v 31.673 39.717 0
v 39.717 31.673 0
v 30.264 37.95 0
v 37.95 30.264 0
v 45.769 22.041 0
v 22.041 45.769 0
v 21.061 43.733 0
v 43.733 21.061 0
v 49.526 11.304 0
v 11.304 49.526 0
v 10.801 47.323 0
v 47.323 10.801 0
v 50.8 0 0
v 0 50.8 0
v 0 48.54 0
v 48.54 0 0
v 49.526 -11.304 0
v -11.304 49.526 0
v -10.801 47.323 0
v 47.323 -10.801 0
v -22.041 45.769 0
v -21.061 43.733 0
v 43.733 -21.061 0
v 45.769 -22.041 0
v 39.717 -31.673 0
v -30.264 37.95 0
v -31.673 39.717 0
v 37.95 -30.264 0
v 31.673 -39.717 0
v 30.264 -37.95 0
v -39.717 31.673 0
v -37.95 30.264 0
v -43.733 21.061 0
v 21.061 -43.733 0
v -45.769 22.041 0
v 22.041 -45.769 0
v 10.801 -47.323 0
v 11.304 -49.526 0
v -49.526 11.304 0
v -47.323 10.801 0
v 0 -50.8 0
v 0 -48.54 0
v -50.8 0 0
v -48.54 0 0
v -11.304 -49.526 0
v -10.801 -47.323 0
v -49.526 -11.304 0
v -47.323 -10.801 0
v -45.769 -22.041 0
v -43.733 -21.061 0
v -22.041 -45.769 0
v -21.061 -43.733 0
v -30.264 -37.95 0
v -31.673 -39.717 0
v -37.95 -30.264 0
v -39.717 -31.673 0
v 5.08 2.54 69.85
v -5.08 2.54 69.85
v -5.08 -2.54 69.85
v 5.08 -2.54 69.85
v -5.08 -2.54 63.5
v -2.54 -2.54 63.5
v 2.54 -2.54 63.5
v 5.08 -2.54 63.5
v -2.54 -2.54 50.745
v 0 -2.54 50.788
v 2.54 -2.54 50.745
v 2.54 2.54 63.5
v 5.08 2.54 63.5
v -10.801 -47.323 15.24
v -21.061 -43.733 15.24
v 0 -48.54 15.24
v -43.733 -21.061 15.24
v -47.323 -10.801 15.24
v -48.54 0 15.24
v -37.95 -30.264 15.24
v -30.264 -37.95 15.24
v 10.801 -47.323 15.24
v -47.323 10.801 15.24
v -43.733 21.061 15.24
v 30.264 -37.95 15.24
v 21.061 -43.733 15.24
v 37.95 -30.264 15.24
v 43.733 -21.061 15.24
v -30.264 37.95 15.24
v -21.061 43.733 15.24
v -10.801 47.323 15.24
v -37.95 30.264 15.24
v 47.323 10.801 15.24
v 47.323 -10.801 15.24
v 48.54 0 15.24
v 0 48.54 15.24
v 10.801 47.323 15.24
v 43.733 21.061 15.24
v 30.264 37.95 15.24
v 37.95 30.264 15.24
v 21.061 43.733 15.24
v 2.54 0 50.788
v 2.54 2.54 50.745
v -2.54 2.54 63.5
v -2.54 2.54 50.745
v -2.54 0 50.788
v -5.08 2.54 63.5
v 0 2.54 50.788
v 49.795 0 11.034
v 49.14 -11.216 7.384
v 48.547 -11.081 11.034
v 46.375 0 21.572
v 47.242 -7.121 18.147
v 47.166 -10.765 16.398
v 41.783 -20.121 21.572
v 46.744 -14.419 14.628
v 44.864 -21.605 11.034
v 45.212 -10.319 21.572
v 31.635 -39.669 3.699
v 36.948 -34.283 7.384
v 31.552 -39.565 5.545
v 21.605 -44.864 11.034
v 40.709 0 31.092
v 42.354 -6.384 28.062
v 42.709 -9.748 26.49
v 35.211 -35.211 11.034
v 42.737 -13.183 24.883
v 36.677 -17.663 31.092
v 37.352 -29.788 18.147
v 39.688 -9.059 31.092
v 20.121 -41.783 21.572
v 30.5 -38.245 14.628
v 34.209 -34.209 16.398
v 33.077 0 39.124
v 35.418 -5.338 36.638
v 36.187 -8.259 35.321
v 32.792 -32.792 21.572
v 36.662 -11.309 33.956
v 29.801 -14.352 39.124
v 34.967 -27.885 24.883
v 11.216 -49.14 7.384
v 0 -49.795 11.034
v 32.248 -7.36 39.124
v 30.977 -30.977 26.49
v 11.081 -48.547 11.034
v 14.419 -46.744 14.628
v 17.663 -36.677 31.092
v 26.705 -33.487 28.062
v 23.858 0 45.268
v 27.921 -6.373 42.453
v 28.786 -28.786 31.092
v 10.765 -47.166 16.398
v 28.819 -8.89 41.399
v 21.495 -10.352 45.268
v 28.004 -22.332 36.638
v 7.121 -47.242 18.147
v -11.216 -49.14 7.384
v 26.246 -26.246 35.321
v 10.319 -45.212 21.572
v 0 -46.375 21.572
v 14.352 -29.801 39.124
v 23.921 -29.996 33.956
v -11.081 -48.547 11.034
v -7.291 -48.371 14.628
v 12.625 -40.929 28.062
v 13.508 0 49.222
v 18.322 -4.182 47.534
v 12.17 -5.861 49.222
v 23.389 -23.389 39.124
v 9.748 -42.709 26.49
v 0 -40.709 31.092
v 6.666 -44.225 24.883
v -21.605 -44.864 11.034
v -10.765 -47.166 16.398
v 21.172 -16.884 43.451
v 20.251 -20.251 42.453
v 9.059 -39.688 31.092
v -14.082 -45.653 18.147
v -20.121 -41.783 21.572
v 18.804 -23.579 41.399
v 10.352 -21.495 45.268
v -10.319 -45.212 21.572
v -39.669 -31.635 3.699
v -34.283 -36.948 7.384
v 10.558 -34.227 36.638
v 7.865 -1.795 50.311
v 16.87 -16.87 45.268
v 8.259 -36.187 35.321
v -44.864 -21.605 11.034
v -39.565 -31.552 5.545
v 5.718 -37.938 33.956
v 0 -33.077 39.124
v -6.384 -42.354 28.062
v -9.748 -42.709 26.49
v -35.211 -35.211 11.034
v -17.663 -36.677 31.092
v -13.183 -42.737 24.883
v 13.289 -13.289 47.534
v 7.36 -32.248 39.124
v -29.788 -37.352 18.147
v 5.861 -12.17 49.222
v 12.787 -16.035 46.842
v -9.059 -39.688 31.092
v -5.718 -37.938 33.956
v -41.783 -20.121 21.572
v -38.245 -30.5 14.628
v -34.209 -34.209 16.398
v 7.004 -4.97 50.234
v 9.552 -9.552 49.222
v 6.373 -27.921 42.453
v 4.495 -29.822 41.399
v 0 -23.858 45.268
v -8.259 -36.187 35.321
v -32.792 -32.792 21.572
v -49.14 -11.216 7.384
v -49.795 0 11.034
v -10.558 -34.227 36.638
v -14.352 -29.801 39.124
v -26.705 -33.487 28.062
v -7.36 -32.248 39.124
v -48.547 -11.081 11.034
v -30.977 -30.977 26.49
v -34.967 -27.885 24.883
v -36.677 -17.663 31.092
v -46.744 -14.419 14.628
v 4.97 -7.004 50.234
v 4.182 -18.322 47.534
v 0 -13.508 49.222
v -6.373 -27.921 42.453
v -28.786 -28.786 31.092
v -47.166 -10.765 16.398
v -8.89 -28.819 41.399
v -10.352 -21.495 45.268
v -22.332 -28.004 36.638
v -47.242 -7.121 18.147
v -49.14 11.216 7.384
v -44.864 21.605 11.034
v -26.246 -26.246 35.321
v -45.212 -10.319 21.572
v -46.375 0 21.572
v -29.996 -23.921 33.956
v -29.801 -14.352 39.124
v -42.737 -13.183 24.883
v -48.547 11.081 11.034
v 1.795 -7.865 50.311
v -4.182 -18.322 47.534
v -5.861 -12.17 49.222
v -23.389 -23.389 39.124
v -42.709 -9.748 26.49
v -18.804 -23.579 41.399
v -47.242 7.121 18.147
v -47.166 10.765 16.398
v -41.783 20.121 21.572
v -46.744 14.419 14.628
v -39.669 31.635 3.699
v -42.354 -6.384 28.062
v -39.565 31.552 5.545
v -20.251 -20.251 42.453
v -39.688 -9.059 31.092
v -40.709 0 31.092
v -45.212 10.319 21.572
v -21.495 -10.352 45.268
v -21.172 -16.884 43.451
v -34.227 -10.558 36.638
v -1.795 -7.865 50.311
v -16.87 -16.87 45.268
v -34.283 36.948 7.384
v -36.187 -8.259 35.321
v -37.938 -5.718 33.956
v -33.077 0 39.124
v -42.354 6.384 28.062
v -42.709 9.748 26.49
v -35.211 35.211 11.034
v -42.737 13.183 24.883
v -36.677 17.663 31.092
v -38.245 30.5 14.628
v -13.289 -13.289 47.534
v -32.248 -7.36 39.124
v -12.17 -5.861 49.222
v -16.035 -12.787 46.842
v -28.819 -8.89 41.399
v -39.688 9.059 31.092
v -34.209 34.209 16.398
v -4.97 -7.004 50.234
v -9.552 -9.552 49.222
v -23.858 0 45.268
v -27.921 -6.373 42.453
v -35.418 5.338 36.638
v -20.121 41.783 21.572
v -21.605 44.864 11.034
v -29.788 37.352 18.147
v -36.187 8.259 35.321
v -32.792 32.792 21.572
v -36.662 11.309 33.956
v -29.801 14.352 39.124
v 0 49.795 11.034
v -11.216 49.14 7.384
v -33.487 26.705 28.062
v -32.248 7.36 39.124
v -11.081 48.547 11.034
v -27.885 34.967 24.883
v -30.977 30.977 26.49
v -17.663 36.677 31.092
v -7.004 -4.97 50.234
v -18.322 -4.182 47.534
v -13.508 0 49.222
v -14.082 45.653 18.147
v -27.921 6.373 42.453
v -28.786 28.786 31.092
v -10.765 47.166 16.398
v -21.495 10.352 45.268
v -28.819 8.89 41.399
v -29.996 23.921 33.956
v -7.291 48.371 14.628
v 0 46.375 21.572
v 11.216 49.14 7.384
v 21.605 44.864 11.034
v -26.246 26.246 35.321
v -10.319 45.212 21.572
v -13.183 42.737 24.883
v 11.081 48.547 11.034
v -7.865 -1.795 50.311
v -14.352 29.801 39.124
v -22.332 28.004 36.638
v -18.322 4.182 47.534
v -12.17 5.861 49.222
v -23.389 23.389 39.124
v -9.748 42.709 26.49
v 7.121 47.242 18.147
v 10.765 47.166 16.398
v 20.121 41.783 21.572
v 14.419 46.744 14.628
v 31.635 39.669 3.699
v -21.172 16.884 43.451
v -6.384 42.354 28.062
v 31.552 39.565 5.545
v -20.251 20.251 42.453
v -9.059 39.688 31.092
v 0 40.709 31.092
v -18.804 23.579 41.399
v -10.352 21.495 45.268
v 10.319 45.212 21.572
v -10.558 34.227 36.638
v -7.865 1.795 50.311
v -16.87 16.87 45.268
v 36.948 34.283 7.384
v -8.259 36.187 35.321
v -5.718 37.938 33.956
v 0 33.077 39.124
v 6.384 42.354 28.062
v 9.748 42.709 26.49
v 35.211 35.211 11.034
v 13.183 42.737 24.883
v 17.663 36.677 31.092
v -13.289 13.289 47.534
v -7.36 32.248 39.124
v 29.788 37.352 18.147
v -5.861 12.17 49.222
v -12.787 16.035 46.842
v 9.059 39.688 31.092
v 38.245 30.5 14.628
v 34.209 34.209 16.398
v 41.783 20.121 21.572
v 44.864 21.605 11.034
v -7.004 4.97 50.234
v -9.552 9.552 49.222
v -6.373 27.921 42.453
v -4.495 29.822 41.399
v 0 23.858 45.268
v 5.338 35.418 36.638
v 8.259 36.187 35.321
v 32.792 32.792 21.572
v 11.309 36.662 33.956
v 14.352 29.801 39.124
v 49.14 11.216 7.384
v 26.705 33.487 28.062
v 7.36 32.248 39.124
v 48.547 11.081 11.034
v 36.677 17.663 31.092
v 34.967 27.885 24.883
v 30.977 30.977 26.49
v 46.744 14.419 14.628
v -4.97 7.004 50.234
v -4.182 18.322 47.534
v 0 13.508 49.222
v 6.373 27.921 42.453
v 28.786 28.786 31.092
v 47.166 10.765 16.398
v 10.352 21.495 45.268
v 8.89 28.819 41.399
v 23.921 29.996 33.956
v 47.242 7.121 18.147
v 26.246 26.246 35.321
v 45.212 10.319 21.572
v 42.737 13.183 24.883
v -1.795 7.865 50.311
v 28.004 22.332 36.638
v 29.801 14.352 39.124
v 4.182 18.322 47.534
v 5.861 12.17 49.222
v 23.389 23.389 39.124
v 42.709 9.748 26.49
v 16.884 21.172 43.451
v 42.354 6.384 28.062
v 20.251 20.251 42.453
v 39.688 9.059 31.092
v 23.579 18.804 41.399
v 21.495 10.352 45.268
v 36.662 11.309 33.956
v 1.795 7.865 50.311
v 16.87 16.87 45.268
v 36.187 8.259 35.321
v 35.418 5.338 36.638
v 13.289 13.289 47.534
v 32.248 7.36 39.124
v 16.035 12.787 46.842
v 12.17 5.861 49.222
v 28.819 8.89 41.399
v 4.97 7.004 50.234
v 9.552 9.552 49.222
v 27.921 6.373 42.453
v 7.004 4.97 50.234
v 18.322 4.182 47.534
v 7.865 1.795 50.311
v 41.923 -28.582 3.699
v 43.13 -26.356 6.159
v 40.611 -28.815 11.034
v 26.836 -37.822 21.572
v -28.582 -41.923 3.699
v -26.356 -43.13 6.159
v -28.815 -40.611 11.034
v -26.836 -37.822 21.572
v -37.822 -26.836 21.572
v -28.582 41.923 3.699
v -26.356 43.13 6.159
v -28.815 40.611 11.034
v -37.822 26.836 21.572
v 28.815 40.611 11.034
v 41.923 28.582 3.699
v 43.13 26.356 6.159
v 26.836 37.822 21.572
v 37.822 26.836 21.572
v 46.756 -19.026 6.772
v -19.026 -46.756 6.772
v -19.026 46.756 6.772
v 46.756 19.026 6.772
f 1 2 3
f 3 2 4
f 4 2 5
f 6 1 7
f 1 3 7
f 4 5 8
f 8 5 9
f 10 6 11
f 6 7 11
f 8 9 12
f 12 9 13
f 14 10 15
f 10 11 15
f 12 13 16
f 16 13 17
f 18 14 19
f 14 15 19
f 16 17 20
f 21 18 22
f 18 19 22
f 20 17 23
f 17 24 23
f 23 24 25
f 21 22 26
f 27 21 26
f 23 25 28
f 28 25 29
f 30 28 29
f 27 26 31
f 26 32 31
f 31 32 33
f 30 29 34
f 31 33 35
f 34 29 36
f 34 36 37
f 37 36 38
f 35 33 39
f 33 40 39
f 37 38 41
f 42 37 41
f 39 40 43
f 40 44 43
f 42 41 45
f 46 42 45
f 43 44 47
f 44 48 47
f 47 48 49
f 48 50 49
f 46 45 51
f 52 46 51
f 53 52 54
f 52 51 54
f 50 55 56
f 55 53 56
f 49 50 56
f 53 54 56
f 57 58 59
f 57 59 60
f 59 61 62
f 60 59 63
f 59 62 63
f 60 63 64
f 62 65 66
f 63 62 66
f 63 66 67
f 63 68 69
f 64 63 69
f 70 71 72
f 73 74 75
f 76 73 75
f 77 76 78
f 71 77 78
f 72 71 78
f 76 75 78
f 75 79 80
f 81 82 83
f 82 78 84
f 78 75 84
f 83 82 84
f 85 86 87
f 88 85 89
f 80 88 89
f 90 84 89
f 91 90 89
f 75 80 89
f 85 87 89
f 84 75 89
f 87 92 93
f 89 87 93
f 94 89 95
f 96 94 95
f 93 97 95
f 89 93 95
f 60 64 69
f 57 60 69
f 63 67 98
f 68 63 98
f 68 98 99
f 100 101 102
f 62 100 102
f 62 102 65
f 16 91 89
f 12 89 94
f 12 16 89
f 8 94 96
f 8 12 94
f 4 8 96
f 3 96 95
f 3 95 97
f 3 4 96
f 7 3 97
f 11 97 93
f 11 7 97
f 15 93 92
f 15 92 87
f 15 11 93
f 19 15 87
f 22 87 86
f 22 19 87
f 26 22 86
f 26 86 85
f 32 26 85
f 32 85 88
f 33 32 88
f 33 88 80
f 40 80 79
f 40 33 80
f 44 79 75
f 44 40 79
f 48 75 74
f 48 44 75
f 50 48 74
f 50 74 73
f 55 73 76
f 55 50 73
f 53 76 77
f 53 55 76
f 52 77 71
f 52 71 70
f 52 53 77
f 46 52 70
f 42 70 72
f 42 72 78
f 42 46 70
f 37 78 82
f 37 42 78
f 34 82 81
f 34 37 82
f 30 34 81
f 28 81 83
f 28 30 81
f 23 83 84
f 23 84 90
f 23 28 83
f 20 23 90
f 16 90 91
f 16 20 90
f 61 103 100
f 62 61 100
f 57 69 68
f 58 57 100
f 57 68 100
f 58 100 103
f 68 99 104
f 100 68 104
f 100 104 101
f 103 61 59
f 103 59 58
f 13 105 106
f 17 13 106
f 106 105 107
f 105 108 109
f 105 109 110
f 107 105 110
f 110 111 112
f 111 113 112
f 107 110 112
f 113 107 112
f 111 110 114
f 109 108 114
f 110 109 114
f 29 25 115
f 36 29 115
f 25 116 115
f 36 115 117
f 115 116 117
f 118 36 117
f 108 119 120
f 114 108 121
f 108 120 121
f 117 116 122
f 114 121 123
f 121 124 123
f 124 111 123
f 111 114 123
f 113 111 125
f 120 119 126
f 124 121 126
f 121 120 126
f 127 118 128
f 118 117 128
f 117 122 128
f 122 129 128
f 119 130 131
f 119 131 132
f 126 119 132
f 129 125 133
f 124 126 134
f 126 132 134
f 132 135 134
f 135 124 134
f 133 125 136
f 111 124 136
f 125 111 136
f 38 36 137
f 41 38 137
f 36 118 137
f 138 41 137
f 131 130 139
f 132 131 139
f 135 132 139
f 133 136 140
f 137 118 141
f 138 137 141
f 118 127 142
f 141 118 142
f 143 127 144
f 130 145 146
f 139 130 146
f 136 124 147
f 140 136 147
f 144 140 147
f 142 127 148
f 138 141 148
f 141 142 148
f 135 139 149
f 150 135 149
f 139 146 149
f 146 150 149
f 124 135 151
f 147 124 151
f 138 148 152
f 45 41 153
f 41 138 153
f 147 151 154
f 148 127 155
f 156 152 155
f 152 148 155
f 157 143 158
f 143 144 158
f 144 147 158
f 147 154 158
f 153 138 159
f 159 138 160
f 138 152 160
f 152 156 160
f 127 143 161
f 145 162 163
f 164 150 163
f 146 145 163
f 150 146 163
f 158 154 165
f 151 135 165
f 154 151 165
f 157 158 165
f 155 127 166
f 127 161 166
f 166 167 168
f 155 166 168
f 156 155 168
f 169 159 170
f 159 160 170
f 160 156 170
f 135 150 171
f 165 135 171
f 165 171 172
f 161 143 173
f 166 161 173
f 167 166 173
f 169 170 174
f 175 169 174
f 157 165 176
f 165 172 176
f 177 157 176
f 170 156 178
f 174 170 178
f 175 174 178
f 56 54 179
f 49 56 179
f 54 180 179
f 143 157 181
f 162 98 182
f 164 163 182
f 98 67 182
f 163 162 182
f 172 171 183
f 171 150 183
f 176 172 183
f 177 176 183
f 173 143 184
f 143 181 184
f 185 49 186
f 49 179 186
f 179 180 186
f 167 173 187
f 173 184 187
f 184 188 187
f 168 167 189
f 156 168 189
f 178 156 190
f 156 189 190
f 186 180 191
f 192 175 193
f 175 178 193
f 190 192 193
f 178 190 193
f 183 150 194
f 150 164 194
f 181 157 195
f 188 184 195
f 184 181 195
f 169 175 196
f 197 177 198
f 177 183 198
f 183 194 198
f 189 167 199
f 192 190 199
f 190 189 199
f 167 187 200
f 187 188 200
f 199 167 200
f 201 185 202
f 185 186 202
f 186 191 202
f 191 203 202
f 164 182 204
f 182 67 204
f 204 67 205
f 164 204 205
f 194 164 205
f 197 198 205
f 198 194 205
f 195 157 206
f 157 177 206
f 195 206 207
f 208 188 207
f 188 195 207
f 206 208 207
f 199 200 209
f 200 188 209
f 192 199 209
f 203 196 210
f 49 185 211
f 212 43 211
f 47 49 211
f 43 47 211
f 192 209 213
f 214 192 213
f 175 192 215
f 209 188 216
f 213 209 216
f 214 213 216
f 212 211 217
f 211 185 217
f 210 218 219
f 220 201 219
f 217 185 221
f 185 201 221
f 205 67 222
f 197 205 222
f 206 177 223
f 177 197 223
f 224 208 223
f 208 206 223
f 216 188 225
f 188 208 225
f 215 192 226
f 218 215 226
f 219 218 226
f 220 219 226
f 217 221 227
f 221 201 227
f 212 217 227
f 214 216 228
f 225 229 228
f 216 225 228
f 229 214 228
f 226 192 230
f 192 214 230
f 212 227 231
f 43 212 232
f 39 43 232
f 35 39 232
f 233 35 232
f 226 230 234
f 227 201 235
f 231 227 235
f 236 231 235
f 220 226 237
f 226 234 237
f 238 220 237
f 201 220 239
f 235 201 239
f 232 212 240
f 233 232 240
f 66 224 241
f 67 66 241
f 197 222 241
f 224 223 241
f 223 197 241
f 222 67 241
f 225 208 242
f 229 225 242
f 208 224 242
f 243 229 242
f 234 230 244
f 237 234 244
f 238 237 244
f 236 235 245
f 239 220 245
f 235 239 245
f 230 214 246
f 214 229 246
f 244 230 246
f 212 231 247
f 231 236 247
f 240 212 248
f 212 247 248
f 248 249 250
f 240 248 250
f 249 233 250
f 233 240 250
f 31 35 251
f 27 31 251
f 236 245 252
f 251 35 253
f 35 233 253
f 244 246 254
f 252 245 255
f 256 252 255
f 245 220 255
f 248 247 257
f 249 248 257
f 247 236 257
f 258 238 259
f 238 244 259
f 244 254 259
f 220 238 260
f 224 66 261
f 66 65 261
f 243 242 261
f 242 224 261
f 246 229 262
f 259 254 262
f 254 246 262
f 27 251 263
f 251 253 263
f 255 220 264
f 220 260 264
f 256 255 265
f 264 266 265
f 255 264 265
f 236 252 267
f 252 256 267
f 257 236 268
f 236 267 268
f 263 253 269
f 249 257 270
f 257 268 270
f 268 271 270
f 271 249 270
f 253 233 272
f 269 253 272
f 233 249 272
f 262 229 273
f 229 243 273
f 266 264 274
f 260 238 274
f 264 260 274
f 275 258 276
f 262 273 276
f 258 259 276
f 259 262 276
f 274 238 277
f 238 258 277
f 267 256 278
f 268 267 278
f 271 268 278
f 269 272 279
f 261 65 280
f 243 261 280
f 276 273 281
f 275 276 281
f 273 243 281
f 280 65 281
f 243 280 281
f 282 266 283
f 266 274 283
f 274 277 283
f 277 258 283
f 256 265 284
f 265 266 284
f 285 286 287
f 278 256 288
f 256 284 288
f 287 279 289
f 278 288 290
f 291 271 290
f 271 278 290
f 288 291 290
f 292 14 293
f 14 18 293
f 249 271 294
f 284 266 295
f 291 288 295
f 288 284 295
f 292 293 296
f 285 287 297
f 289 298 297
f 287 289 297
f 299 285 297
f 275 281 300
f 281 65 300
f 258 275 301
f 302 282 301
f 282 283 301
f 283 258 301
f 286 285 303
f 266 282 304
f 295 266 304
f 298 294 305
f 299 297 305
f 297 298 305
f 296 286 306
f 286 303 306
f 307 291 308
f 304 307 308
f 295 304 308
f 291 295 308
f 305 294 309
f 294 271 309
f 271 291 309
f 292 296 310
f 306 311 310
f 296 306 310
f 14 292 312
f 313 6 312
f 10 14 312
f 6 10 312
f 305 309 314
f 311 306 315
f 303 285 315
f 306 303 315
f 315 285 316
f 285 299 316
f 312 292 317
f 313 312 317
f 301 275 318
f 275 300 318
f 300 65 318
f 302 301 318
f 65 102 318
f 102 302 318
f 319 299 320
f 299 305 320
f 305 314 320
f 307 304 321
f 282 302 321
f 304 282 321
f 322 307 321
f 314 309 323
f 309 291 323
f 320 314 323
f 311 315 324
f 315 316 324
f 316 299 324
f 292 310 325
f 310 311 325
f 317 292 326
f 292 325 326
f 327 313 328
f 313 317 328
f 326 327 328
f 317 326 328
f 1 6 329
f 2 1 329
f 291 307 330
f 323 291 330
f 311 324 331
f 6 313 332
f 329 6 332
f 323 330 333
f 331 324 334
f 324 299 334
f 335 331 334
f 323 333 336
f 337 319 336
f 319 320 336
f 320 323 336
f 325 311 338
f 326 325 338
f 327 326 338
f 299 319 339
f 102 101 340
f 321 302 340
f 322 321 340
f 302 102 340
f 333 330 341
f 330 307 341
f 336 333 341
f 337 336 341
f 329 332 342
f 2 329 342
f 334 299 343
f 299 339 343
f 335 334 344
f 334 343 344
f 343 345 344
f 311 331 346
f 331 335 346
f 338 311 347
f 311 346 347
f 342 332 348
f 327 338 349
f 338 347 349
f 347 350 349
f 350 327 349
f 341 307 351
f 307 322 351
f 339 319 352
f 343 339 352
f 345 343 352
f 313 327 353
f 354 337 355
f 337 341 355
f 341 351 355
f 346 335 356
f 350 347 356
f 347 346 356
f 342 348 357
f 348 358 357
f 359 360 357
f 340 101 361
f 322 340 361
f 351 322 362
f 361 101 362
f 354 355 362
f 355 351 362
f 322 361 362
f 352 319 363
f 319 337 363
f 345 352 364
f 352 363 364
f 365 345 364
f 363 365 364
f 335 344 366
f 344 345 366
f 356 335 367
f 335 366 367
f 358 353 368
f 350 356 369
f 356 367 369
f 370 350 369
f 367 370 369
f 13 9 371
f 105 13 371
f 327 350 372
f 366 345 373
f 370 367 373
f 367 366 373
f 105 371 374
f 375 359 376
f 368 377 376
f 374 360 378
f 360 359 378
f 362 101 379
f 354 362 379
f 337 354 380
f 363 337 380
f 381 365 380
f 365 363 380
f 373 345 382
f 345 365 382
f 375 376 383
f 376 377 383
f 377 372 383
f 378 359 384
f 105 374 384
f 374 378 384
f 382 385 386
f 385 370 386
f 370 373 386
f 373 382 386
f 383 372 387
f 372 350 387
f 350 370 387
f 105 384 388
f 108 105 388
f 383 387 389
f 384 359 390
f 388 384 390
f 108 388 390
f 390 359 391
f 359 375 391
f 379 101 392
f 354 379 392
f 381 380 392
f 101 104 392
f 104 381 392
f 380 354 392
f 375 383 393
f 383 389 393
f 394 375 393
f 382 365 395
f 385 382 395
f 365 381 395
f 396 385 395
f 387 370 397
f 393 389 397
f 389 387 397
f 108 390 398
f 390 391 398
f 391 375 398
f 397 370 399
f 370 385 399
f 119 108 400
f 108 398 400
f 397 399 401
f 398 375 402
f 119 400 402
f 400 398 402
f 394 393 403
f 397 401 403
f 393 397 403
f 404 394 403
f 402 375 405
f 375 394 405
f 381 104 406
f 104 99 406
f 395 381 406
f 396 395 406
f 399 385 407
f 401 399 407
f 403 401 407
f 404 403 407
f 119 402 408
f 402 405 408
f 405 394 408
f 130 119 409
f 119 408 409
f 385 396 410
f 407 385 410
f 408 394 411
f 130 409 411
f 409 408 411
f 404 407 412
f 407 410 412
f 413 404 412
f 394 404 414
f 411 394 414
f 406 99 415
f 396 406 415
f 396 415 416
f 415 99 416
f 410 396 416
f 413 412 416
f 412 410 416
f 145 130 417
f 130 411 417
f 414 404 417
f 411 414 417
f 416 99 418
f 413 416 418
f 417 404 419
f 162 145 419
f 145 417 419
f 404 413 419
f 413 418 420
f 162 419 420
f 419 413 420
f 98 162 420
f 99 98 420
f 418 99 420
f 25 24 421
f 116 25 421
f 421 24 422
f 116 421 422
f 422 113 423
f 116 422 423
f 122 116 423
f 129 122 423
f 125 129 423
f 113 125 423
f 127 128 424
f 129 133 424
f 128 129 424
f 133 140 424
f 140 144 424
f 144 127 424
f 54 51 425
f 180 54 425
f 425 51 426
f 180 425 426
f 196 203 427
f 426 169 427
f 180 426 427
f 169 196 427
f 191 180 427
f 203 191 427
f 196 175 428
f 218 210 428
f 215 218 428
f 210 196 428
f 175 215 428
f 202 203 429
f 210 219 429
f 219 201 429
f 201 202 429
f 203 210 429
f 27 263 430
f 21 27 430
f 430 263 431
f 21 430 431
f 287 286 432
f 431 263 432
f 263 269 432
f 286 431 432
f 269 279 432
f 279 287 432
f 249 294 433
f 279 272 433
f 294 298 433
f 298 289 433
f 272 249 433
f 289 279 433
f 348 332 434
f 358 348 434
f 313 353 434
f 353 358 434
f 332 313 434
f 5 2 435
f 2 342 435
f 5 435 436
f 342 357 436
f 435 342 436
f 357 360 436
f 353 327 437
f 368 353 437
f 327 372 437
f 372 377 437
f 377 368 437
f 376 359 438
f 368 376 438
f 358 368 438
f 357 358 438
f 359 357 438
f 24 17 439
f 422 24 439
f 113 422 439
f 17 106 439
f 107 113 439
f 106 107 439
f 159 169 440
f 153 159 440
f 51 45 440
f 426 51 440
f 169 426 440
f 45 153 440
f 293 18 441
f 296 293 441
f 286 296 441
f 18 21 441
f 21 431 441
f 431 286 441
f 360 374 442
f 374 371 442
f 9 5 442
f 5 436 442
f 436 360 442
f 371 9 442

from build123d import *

# Parameters (mm, degrees)
F3_DEPTH = 15.24
F5_START = 44.704
F5_DEPTH = 18.796
F6_W     = 2.54
F6_H     = 5.08
F6_W_2   = 5.08
F7_DEPTH = 6.35
F8_DEPTH = 50.8


with BuildPart() as f1:
    # F0 (on Front) → F1 (revolve)
    with BuildSketch(Plane.XZ):
        with BuildLine():
            Line((0, 50.8), (0, 0))
            Line((0, 0), (50.8, 0))
            ThreePointArc((50.8, 0), (36.2305621639, 36.2305621639), (0, 50.8))
        make_face()
    revolve(axis=Axis((0, 0, 25.4), (0, 0, -1)))

    # F2 (on Top) → F3 (cut)
    with BuildSketch(Plane.XY):
        with BuildLine():
            ThreePointArc((-48.5403721845, 0), (0, -48.5403721845), (48.5403721845, 0))
            ThreePointArc((48.5403721845, 0), (0, 48.5403721845), (-48.5403721845, 0))
        make_face()
    extrude(amount=F3_DEPTH, mode=Mode.SUBTRACT)

    # F4 (on Top) → F5 (join)
    with BuildSketch(Plane.XY.offset(F5_START)):
        Polygon((2.54, -2.54), (2.54, 0), (2.54, 2.54), (-2.54, 2.54), (-2.54, -2.54), align=None)
    extrude(amount=F5_DEPTH)

    # F6 (on face) → F7 (join)
    with BuildSketch(Plane.XY.offset(63.5)):
        with Locations((-3.81, 0)):
            Rectangle(F6_W, F6_H)
        with Locations((3.81, 0)):
            Rectangle(F6_W, F6_H)
        Rectangle(F6_W_2, F6_H)
    extrude(amount=F7_DEPTH)

    # F4 (on Top) → F8 (cut)
    with BuildSketch(Plane.XY):
        Polygon((2.54, -2.54), (2.54, 0), (2.54, 2.54), (-2.54, 2.54), (-2.54, -2.54), align=None)
    extrude(amount=-F8_DEPTH, mode=Mode.SUBTRACT)


solid = f1.part
